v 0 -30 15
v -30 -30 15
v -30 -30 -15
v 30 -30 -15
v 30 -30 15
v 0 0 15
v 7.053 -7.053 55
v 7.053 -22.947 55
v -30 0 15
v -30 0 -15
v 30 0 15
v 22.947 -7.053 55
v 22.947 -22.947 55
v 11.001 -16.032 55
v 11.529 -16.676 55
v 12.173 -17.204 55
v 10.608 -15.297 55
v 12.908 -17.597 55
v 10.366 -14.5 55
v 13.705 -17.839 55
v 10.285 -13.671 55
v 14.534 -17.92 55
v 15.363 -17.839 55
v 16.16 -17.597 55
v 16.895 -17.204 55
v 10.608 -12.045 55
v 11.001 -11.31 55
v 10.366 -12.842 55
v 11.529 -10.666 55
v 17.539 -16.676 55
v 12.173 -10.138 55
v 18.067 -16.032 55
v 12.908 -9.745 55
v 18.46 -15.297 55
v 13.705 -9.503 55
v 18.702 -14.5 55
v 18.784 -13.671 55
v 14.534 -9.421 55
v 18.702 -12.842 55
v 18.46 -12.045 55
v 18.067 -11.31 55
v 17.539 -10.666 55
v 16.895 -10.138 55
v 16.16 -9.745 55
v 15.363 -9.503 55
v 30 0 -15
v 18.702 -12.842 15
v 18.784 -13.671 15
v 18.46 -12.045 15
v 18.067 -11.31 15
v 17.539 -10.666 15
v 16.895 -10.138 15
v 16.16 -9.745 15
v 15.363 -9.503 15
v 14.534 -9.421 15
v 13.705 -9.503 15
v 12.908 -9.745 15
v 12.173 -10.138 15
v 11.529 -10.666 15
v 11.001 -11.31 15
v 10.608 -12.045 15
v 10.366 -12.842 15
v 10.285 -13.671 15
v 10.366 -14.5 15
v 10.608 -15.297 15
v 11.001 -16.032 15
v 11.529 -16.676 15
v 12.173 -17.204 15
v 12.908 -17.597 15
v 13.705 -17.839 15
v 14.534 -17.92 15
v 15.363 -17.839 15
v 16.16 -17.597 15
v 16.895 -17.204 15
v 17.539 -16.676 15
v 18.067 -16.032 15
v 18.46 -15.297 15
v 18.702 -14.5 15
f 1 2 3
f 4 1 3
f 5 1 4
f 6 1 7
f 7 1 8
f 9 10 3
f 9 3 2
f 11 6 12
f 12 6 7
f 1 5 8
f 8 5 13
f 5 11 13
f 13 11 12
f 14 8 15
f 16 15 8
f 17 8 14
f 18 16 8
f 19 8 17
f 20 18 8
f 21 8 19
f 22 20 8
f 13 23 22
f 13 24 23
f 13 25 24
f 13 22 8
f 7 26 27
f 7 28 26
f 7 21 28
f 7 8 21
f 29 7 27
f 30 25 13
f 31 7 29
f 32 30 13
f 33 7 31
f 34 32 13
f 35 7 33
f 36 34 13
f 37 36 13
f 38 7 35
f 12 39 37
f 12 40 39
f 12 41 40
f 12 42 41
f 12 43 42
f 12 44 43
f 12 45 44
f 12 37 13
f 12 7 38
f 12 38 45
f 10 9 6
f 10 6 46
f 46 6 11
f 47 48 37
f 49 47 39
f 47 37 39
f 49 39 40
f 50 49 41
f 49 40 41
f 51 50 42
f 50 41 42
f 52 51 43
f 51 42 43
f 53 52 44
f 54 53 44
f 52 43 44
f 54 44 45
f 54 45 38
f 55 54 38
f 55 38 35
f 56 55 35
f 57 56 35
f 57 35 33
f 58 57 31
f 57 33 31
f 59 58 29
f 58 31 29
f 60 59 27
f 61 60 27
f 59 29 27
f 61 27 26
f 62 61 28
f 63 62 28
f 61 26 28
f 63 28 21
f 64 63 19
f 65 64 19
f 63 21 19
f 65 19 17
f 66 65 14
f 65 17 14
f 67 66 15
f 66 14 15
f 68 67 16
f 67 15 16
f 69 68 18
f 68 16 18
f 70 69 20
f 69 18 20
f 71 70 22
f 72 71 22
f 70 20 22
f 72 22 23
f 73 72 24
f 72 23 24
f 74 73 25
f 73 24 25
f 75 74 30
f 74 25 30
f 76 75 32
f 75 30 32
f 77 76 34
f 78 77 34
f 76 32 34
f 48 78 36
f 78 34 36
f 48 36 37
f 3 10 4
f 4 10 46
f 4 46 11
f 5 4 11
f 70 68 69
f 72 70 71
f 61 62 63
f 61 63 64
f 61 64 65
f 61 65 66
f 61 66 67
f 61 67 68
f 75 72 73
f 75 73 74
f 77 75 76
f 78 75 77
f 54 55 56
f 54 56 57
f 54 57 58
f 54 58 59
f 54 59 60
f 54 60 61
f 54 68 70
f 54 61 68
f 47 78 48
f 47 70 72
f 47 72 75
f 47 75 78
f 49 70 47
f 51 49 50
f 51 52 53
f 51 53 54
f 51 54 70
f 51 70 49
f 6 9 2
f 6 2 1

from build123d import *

# Parameters (mm, degrees)
F0_W     = 60
F0_H     = 30
F1_DEPTH = 30
F2_W     = 30
F2_H     = 30
F3_DEPTH = 40
F3_TAPER = 10
F4_R     = 4.2494021433
F5_DEPTH = 40


with BuildPart() as f1:
    # F0 (on Front) → F1 (new body)
    with BuildSketch(Plane.XZ):
        Rectangle(F0_W, F0_H)
    extrude(amount=F1_DEPTH)

    # F2 (on face) → F3 (join)
    with BuildSketch(Plane.XY.offset(15)):
        with Locations((15, -15)):
            Rectangle(F2_W, F2_H)
    extrude(amount=F3_DEPTH, taper=F3_TAPER)

    # F4 (on face) → F5 (cut)
    with BuildSketch(Plane.XY.offset(55)):
        with Locations((14.5341921598, -13.6707741767)):
            Circle(F4_R)
    extrude(amount=-F5_DEPTH, mode=Mode.SUBTRACT)


solid = f1.part
